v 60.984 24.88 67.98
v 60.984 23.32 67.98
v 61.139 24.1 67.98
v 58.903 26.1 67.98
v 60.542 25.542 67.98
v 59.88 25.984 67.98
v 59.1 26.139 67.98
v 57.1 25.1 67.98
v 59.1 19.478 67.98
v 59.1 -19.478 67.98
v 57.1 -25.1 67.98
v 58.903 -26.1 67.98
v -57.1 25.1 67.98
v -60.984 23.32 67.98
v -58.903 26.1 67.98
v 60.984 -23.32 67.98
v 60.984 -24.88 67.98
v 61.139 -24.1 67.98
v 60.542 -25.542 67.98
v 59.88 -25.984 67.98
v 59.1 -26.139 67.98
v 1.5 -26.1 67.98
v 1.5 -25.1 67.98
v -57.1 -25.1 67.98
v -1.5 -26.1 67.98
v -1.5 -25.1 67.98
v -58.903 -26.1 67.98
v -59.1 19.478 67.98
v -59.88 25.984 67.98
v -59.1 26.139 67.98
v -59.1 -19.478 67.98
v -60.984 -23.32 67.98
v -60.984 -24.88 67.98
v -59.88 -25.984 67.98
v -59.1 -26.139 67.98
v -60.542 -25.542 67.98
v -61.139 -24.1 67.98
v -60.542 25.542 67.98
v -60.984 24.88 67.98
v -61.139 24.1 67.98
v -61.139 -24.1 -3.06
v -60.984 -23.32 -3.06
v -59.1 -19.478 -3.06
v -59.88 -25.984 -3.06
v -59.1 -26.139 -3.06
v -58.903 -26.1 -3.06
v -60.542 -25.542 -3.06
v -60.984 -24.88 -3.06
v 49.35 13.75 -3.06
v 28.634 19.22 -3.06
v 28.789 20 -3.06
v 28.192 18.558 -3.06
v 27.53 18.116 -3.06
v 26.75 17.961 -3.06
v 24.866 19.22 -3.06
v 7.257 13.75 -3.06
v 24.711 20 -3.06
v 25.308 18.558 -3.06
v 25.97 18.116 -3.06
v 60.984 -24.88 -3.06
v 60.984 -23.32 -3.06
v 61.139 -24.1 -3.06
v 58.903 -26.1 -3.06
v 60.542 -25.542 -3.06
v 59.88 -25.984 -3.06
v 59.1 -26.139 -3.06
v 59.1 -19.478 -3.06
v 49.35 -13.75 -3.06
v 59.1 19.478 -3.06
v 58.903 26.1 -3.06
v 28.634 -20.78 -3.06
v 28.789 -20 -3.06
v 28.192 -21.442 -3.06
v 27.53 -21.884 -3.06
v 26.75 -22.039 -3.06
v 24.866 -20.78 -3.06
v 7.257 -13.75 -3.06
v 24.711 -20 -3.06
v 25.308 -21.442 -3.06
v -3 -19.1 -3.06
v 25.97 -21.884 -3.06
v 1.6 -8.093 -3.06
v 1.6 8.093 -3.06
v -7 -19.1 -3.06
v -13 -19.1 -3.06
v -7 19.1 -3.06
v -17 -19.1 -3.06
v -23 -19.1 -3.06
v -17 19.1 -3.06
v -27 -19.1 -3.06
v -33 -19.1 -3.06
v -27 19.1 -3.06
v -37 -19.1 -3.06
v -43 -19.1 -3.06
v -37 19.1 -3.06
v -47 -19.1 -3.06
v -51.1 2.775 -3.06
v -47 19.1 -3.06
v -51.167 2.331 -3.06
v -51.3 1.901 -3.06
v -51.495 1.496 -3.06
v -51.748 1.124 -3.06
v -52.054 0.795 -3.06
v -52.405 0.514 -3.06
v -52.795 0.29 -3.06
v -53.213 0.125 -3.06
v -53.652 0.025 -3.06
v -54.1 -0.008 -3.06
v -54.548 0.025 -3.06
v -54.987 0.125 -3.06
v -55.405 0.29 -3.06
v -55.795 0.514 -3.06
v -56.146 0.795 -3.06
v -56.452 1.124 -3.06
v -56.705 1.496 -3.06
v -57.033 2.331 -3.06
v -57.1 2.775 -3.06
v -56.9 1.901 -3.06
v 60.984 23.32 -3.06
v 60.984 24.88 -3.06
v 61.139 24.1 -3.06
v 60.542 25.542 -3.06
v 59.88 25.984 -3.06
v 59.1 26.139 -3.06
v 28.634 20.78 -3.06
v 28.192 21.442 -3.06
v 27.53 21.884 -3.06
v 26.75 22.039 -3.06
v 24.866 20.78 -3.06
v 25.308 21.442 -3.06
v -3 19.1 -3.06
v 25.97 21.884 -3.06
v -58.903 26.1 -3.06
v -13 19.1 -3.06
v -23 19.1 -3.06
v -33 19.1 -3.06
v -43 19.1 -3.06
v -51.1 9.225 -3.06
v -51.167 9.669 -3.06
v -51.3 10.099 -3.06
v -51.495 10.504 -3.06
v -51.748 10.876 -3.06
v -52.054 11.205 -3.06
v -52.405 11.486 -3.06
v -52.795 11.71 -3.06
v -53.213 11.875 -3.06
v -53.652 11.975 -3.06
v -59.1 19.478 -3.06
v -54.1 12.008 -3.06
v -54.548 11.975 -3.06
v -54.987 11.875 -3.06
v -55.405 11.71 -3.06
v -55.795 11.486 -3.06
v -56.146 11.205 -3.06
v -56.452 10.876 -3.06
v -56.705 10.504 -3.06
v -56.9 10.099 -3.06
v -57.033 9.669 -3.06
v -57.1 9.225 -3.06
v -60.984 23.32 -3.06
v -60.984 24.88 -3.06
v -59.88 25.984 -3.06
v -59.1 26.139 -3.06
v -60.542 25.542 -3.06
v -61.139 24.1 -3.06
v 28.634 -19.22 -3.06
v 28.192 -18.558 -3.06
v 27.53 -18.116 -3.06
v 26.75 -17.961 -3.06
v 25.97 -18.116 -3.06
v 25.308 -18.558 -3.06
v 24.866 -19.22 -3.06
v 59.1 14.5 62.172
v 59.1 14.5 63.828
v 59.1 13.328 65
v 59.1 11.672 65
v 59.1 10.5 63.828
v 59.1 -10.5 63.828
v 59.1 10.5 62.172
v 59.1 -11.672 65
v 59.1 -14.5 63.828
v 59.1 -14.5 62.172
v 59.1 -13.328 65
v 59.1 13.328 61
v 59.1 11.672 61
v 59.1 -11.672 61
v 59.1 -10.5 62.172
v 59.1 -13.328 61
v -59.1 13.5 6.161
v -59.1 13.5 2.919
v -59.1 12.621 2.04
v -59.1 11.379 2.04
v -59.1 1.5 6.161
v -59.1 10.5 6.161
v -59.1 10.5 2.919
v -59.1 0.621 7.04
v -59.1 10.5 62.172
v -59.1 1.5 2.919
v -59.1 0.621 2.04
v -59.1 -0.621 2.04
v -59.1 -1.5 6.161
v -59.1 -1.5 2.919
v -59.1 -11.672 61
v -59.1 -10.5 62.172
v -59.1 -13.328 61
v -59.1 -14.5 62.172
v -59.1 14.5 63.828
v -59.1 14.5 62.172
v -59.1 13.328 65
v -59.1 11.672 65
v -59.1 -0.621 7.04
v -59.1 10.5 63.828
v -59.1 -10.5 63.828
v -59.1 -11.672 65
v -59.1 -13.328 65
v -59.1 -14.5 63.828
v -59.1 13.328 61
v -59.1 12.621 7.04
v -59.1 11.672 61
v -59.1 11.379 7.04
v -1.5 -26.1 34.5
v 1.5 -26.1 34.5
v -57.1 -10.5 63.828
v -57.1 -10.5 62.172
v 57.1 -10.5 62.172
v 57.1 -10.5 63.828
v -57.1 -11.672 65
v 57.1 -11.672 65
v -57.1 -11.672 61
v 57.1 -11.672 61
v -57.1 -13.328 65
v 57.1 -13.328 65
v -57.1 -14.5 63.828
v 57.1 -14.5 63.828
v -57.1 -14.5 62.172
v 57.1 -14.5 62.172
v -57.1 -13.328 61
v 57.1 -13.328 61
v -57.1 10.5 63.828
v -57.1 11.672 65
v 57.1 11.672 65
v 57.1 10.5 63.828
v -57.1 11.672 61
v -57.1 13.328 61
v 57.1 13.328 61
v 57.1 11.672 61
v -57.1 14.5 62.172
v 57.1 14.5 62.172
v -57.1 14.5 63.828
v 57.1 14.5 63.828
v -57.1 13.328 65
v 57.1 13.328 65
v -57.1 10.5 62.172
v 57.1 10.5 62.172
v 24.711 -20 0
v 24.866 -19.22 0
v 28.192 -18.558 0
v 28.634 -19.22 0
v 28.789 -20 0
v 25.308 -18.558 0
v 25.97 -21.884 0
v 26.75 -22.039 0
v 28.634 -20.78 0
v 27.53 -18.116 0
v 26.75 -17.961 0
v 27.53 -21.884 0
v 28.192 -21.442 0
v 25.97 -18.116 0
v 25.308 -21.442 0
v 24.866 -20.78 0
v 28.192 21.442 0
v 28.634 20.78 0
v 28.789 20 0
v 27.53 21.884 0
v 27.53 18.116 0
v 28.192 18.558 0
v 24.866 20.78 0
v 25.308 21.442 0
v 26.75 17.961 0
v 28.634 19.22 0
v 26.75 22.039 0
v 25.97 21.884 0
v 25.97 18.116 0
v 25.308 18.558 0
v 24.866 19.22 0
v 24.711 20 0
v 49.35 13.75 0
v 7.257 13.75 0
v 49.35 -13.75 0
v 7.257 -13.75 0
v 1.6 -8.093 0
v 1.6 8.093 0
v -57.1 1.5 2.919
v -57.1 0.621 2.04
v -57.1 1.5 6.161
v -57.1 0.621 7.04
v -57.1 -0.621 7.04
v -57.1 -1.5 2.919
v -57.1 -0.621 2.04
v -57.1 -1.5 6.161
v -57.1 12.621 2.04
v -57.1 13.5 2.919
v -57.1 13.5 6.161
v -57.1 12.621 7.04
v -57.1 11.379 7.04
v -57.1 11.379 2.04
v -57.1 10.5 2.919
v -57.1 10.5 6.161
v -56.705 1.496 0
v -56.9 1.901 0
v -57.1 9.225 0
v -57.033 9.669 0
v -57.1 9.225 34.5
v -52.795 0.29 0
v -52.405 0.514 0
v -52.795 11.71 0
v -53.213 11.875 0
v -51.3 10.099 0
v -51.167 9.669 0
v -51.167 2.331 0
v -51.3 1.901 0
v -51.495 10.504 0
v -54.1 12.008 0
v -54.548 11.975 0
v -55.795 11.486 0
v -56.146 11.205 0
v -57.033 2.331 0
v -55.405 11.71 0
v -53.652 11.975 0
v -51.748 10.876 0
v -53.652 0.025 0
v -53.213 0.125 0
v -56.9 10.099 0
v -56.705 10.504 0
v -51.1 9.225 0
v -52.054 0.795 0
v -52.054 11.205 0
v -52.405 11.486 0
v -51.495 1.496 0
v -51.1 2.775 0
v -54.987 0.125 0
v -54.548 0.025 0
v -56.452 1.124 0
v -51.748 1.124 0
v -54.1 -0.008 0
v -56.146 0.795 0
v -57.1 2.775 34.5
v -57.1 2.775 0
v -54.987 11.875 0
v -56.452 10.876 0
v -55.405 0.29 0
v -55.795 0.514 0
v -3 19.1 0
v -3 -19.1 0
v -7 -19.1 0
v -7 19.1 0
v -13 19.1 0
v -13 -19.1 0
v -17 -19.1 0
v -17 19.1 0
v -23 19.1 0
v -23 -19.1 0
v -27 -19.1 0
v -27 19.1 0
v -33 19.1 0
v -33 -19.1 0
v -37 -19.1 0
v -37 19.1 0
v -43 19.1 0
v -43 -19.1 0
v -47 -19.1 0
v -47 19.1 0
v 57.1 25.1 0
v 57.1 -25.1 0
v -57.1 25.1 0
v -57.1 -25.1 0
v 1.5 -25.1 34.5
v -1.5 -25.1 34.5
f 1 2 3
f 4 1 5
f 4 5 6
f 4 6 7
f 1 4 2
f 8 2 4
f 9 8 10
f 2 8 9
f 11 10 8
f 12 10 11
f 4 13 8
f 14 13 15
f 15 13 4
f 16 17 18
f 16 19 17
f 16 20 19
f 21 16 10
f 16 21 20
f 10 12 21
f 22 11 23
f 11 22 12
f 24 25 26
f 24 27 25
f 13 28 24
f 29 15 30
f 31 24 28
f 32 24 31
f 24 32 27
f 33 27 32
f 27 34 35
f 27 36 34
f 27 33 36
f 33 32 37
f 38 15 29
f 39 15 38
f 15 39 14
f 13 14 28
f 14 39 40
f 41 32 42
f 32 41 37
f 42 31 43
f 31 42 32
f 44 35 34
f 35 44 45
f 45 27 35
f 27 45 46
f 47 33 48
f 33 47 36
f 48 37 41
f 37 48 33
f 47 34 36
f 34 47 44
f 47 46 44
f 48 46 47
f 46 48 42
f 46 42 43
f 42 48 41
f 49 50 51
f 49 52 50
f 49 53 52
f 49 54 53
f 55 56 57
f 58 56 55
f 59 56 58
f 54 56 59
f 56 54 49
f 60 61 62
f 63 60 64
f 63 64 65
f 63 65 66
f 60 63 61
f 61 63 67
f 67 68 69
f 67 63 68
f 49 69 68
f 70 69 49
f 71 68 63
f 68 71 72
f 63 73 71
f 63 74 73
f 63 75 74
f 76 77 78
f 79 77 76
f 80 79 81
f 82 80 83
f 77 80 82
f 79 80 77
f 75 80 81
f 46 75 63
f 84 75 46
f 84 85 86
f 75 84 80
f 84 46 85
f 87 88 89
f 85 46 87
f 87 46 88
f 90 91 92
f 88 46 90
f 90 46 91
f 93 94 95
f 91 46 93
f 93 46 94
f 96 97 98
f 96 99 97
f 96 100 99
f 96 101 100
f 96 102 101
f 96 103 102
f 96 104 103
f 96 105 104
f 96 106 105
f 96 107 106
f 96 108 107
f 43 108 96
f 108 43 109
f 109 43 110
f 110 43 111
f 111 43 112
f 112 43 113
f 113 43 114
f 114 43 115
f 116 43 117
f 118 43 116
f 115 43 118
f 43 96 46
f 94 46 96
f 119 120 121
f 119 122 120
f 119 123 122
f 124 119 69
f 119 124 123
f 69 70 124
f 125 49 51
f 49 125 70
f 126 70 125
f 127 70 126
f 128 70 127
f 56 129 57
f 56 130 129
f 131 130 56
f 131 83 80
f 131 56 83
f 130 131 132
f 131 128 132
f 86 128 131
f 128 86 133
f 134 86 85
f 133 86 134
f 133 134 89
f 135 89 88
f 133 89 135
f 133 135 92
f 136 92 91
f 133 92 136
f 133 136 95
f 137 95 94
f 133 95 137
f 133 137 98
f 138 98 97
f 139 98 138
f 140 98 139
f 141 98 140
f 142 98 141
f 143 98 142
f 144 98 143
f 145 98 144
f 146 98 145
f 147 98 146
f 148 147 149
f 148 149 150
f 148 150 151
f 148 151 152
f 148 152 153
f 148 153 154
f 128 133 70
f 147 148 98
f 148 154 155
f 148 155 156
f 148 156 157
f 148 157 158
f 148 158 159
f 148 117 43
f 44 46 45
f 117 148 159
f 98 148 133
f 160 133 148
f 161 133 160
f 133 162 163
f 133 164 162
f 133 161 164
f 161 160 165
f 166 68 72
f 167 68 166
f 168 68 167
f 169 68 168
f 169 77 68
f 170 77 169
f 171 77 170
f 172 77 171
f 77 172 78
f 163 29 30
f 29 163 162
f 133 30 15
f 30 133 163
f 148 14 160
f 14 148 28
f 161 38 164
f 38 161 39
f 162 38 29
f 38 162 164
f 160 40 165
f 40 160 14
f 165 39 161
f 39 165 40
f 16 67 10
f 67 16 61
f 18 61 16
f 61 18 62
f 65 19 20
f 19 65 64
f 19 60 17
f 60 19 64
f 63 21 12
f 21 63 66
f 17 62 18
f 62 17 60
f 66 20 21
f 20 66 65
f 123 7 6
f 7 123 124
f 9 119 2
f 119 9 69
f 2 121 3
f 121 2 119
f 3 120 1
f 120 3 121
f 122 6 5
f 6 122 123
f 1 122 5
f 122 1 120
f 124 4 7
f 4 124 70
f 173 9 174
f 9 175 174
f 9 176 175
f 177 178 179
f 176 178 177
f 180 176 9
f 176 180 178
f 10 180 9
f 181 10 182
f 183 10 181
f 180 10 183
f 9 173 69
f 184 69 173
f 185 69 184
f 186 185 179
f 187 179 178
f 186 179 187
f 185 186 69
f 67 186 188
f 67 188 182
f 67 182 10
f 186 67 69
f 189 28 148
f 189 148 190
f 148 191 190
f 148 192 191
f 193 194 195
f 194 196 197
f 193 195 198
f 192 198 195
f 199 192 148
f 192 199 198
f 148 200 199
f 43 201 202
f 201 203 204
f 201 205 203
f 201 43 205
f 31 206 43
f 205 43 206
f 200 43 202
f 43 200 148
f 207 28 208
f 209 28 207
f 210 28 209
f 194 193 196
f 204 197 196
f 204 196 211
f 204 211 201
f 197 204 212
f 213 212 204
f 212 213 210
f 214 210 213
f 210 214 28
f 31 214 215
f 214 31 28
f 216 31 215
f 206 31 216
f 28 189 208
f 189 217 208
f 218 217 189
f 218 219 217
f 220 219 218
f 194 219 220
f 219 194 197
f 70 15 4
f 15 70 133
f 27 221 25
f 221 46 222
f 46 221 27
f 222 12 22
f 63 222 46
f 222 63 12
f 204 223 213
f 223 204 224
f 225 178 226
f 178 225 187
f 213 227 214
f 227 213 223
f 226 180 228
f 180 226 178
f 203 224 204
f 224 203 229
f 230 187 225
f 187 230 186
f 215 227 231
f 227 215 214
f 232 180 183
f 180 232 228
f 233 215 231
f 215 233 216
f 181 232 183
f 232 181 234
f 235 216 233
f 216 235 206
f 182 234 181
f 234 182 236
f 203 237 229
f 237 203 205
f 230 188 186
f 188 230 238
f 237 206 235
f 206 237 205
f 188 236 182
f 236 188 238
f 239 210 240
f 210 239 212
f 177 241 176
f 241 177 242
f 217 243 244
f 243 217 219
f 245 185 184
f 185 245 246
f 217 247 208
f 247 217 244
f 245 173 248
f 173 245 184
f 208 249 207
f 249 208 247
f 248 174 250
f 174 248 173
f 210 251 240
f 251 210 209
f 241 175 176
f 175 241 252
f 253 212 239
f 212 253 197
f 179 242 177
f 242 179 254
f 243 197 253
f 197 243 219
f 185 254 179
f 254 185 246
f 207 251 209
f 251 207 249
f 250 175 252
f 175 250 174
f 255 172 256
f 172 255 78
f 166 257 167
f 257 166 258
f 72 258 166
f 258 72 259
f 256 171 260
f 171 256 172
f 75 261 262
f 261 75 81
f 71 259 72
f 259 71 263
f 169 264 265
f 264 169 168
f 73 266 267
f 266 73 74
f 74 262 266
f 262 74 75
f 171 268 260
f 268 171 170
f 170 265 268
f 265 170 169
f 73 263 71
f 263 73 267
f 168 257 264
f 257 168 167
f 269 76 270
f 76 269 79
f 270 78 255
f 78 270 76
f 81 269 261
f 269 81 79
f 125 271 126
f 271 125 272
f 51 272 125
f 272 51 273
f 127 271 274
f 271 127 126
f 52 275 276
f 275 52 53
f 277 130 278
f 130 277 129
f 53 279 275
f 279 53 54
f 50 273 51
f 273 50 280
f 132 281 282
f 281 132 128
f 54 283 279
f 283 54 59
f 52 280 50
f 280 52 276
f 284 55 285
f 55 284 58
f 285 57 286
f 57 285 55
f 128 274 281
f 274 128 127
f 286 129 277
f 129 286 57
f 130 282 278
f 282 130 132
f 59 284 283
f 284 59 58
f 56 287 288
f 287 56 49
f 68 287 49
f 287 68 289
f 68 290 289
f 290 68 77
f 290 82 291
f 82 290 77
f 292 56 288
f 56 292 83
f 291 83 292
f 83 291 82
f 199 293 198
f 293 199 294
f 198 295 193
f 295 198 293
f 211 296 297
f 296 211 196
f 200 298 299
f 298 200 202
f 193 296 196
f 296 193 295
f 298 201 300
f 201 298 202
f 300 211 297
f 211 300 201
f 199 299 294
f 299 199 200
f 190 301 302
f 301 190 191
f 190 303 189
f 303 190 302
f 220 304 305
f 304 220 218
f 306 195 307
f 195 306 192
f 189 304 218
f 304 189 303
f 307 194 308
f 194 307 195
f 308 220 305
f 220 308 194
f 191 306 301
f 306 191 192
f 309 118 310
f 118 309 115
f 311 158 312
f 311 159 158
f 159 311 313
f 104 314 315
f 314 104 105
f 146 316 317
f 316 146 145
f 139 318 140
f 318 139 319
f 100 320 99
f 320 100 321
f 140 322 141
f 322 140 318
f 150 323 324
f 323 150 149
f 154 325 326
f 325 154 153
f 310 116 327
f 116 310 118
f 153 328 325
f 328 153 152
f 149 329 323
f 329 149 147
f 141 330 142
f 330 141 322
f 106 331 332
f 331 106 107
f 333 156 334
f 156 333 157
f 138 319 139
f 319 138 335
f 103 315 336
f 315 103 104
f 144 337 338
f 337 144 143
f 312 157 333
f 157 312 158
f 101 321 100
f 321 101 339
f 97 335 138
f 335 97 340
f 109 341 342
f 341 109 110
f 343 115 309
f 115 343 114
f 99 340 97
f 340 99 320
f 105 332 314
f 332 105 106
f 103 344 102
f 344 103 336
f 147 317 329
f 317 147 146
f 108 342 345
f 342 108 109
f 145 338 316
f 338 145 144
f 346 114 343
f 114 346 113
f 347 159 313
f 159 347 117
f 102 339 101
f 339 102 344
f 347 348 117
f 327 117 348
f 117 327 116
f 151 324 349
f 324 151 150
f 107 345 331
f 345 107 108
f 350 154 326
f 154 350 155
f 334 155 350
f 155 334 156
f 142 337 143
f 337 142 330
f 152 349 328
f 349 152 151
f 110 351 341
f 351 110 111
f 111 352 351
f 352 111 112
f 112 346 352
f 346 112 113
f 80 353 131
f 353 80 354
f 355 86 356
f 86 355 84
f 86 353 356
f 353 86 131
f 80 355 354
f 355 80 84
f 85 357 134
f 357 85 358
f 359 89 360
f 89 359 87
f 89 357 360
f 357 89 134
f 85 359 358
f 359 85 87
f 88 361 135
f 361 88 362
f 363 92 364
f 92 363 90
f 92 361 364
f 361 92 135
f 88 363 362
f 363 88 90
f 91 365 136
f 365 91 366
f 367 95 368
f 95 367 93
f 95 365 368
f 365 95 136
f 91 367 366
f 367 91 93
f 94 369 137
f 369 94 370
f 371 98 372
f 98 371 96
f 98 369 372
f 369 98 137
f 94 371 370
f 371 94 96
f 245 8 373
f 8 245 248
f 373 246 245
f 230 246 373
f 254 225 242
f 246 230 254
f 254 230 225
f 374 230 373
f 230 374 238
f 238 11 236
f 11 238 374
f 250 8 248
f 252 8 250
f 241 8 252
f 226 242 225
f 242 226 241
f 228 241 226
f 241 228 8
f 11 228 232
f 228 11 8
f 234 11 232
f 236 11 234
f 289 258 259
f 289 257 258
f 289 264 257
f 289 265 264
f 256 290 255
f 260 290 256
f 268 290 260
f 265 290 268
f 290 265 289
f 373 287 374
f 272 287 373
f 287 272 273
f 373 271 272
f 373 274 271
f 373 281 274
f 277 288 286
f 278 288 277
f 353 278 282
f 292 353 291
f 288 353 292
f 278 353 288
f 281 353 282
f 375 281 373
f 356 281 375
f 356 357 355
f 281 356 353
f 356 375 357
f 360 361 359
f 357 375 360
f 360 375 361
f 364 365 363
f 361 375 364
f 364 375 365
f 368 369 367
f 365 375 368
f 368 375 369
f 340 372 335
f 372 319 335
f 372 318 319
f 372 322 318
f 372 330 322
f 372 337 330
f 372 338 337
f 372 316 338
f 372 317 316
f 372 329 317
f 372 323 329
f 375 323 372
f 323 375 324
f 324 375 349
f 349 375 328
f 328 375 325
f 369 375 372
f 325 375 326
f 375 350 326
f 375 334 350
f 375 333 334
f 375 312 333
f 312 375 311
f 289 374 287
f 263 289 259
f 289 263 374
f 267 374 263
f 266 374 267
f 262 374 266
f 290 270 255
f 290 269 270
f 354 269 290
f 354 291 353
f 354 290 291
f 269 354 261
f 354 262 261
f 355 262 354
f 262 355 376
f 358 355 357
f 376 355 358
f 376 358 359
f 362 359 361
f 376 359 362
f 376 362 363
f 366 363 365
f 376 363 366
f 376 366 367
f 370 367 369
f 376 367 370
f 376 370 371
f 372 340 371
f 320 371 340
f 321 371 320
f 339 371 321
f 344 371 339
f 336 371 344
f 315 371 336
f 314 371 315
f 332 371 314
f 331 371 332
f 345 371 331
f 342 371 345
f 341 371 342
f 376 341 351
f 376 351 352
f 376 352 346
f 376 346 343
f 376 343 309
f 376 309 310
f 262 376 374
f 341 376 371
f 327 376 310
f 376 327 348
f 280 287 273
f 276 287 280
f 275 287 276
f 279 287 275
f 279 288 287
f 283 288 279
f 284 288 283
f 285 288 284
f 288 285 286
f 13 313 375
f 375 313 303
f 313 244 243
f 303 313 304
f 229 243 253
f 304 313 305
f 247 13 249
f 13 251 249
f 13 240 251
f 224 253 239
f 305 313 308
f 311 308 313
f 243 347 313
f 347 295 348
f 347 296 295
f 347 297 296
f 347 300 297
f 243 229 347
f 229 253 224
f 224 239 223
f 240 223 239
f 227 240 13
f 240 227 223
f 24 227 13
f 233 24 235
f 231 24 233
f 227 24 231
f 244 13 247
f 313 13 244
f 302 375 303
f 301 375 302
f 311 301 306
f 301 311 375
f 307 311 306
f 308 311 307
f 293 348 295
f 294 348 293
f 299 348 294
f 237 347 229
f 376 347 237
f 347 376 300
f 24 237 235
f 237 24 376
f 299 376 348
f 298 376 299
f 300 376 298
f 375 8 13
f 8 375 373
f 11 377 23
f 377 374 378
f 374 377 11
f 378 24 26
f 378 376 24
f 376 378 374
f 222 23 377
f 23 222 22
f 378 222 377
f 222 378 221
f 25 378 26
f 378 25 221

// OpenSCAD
// file: common.scad
left = -1;
right = 1;
front = -1;
rear = 1;

// adjust these numbers as necessary
psu_length = 215;
psu_width = 114;
psu_height = 50;

// screw terminals
screw_terminal_inset = 17;
screw_terminal_width = 110;
screw_terminal_height = 25;

// large mount holes on the bottom of the PSU
bottom_mount_hole_spacing_width = 50;
bottom_mount_hole_spacing_length = 150;
bottom_mount_hole_spacing_from_end = 32.5;
bottom_mount_hole_spacing_from_side = 32;

side_mount_hole_from_end = 33;
side_mount_hole_spacing = 25;
side_mount_hole_from_top = 13;

mount_hole_diam = 4;
cover_mount_hole_diam = 4.1;

// Don't make this too thin; plug insertion/removal puts a fair amount of strain on the part
wall_thickness = 2;
end_thickness = wall_thickness*2;

total_width = psu_width + wall_thickness * 2;
total_height = psu_height + wall_thickness * 2;

// How far the end of the cover should be from the end of the PSU.
// This is to leave room for the plug and cables (if necessary)
cavity_depth = 0;

function get_total_depth(cavity) = cavity + end_thickness + side_mount_hole_from_end + mount_hole_diam/2 + wall_thickness * 2;

// Hole to feed wires from the PSU to your electronics
wire_hole_width  = 12;
wire_hole_height = 6;

da6 = 1 / cos(180 / 6) / 2;

module mount_hole() {
  rotate([0,90,0]) rotate([0,0,90])
    cylinder(r=cover_mount_hole_diam*da6,h=total_width+1,center=true,$fn=6);
}

module mount_holes() {
  from_center = psu_height/2-side_mount_hole_spacing/2-side_mount_hole_from_top;

  translate([0,-from_center,end_thickness+side_mount_hole_from_end+cavity_depth])
    for(side=[front,rear]) {
      translate([0,-side_mount_hole_spacing/2*side,0]) mount_hole();
    }
}

module vent_holes() {
  // ventilation/material saving holes on the side
  for(from_end=[0:6]) {
    for(from_top=[.8,.45,.1]) {
      translate([-1,psu_height*from_top-wall_thickness,wall_thickness*3.25+8*from_end]) {
        cube([psu_width*2,13,4]);
      }
    }
  }

  // top/bottom holes
  for(from_end=[0:5]) {
    for(from_side=[0:5]) {
      translate([wall_thickness*4+from_side*17.7,-1,wall_thickness*2.5+8*from_end]) {
        cube([13.5,psu_height*2,4]);
      }
    }
  }

  // smaller holes on the end
  for(h=[0]) {
    for(n=[0:5]) {
      translate([wall_thickness*6+8.5*n,wall_thickness*3+h*(total_height/2-wall_thickness),-1])
        cube([4,total_height-wall_thickness*6,psu_length]);
    }
  }
}

module psu() {
  translate([-psu_width/2,-psu_height/2,0])
  difference() {
    cube([psu_width,psu_height,psu_length]);
    translate([(psu_width - screw_terminal_width) / 2, -1, -1]) cube([screw_terminal_width,screw_terminal_height + 1,screw_terminal_inset + 1]);

    // cover mounting holes
    translate([0,side_mount_hole_from_top,side_mount_hole_from_end]) rotate([0,90,0])
      cylinder(h=psu_width * 4,r=mount_hole_diam/2, center=true);
    translate([0,side_mount_hole_from_top + side_mount_hole_spacing,side_mount_hole_from_end]) rotate([0,90,0])
      cylinder(h=psu_width * 4,r=mount_hole_diam/2, center=true);

    // psu mounting holes (terminal side)
    translate([bottom_mount_hole_spacing_from_side,0,bottom_mount_hole_spacing_from_end]) rotate([90,0,0])
      cylinder(h=psu_width * 4,r=mount_hole_diam/2, center=true);
    translate([bottom_mount_hole_spacing_from_side + bottom_mount_hole_spacing_width,0,bottom_mount_hole_spacing_from_end]) rotate([90,0,0])
      cylinder(h=psu_width * 4,r=mount_hole_diam/2, center=true);

    // psu mounting holes (blank side)
    translate([bottom_mount_hole_spacing_from_side,0,bottom_mount_hole_spacing_from_end + bottom_mount_hole_spacing_length]) rotate([90,0,0]) cylinder(h=psu_width * 2,r=mount_hole_diam/2, center=true);
    translate([bottom_mount_hole_spacing_from_side + bottom_mount_hole_spacing_width,0,bottom_mount_hole_spacing_from_end + bottom_mount_hole_spacing_length]) rotate([90,0,0]) cylinder(h=psu_width * 2,r=mount_hole_diam/2, center=true);
  }
}

function accurate_diam(diam,sides=16) = 1 / cos(180 / sides) * diam;

module hole(diam,height,sides=16) {
  diam = accurate_diam(diam,sides);

  cylinder(r=diam/2,h=height,center=true,$fn=sides);
}
// main file
include <common.scad>;

cavity_depth = 30;
total_depth = get_total_depth(cavity_depth);

plug_width = 27.5;
plug_height = 47.5;
plug_hole_from_switch_end = 22.5;
plug_hole_width = 40;

side_brace_width = 6;
top_shortness = screw_terminal_inset;
bottom_shortness = cavity_depth-wall_thickness;

module vent_holes() {
  hole_from_top_bottom = 5;
  hole_length = total_height-wall_thickness*2-hole_from_top_bottom*2;
  hole_width  = 4;
  hole_space_between = 6;
  hole_spacing = hole_width + hole_space_between;

  for(i=[0:4]) {
    translate([i*-hole_spacing-hole_width,0,end_thickness/2]) {
      cube([hole_width,hole_length,end_thickness+1],center=true);
    }
  }
}

module mount_holes() {
  from_center = psu_height/2-side_mount_hole_spacing/2-side_mount_hole_from_top;

  translate([0,-from_center,end_thickness+side_mount_hole_from_end+cavity_depth])
    for(side=[front,rear]) {
      translate([0,-side_mount_hole_spacing/2*side,0]) {
        mount_hole();
      }
    }
}

module old_cover() {
  plug_dist_from_wall = 5;

  difference() {
    translate([0,0,total_depth/2])
      cube([total_width,total_height,total_depth],center=true);

    // main cavity
    translate([0,0,end_thickness+total_depth/2])
      cube([psu_width,psu_height,total_depth],center=true);

    mount_holes();

    translate([0,0,total_depth]) {
      // material saving top
      translate([0,-psu_height/2,0])
        cube([psu_width - side_brace_width*2,wall_thickness*3,top_shortness*2],center=true);

      // material saving bottom
      translate([0,psu_height/2,0])
        cube([psu_width - side_brace_width*2,wall_thickness*3,bottom_shortness*2],center=true);
    }

    vent_holes();

    // plug
    translate([total_width/2-wall_thickness-plug_height/2-plug_dist_from_wall,0,0])
      scale([1,1,10]) rotate([0,0,180]) plug_hole();

    // wire hole
    translate([-total_width/2+wall_thickness+wire_hole_height/2,total_height/4-wire_hole_width/2,end_thickness/2])
      cube([wire_hole_height,wire_hole_width,end_thickness+1],center=true);
  }
}

module old_plug_hole() {
  spacer            = 0.5;
  plug_width        = 27   + spacer;
  plug_length       = 47.5 + spacer;
  plug_angle_length = 8;

  // mounting holes
  for (side=[1,-1]) {
    translate([-1*(plug_height/2-plug_hole_from_switch_end),plug_hole_width/2*side,0])
      hole(3.7,wall_thickness*2,16);
  }

  difference() {
    cube([plug_height,plug_width,wall_thickness],center=true);

    // angled corners on plug side
    for (side=[1,-1]) {
      translate([plug_height/2,plug_width/2*side,0]) {
        rotate([0,0,45]) {
          cube([8.5,8.5,wall_thickness*2],center=true);
        }
      }
    }
  }
}

module plug_hole() {
  spacer            = 0.5;
  plug_width        = 27   + spacer;
  plug_length       = 47.5 + spacer;
  plug_angle_length = 8;
  plug_angle_offset = sqrt(pow(plug_angle_length,2)/2);
  plug_hole_spacing = 40;
  plug_hole_offset  = 1.4;
  hole_height       = 20;

  // mounting holes
  for (side=[front,rear]) {
    translate([plug_hole_offset,plug_hole_spacing/2*side,0]) {
      hole(4,hole_height,16);
    }
  }

  hull() {
    translate([plug_length/4,0,0]) {
      cube([plug_length/2,plug_width,hole_height],center=true);
    }

    // angled corners on plug side
    for (side=[1,-1]) {
      translate([-plug_height/2+plug_angle_offset,(plug_width/2-plug_angle_offset)*side,0]) {
        //cylinder(r=plug_angle_length/2,h=100,center=true,$fn=4);
        hole(plug_angle_length,hole_height,4);
      }
    }
  }
}

module cover() {
  spacer               = 0.2;
  dist_from_psu_to_end = 30;
  plug_dist_from_side  = 8;

  cavity_width  = psu_width  + spacer;
  cavity_height = psu_height + spacer;
  cavity_length = dist_from_psu_to_end + side_mount_hole_from_end + mount_hole_diam/2 + end_thickness;

  side_mount_hole_from_end = 33;
  side_mount_hole_spacing  = 25;
  side_mount_hole_from_top = 13;

  extrusion_width      = 0.5;
  extrusion_height     = 0.34;
  thick_wall_thickness = extrusion_width  * 4;
  thin_wall_thickness  = extrusion_width  * 2;
  end_thickness        = extrusion_height * 6;

  total_width  = cavity_width  + wall_thickness * 2;
  total_height = cavity_height + thin_wall_thickness * 2;

  wire_hole_width  = 6;
  wire_hole_height = 12;

  module body() {
    width  = cavity_width  + thick_wall_thickness * 2;
    height = cavity_height + thin_wall_thickness * 2;

    translate([0,0,cavity_length/2-end_thickness]) {
      cube([width,height,cavity_length+end_thickness],center=true);

      for(side=[left,right]) {
        for(end=[front,rear]) {
          hull() {
            translate([width/2*side,(height/2-thick_wall_thickness)*end,0]) {
              hole(thick_wall_thickness*2,cavity_length+end_thickness,16);
            }
            translate([width*.4*side,0,0]) {
              hole(thick_wall_thickness*2,cavity_length+end_thickness,16);
            }
          }
        }
      }
    }
  }

  module holes() {
    // main cavity
    translate([0,0,cavity_length]) {
      cube([cavity_width,cavity_height,cavity_length*2],center=true);
    }

    // mount holes
    for(side=[front,rear]) {
      translate([0,side_mount_hole_spacing/2*side,dist_from_psu_to_end+side_mount_hole_from_end]) {
        rotate([0,90,0]) {
          rotate([0,0,22.5]) {
            hole(mount_hole_diam,cavity_width*2,8);
          }
        }
      }
    }

    // plug
    translate([cavity_width/2-plug_height/2-plug_dist_from_side,0,0]) {
      scale([1,1,10]) {
        plug_hole();
      }
    }

    // wire retainer/hole
    zip_tie_hole_width  = 3;
    zip_tie_hole_height = 5;
    translate([left*(cavity_width/2-wire_hole_width/2),wire_hole_height/2,0]) {
      hull() {
        for(side=[front,rear]) {
          translate([0,side*(wire_hole_height/2-wire_hole_width/2),0]) {
            rotate([0,0,90]) {
              hole(wire_hole_width,cavity_length,42);
            }
          }
        }
      }

      for(side=[front,rear]) {
        translate([0,(wire_hole_height/2)*side,end_thickness+1.5]) {
          hull() {
            rotate([0,90,0]) {
              rotate([0,0,22.5]) {
                hole(zip_tie_hole_width,cavity_height,8);
              }
            }
            translate([0,0,zip_tie_hole_height-zip_tie_hole_width]) {
              rotate([0,90,0]) {
                rotate([0,0,22.5]) {
                  hole(zip_tie_hole_width,cavity_height,8);
                }
              }
            }
          }
        }
      }
    }

    // vent holes
    hole_from_top_bottom = 5;
    hole_length = total_height-wall_thickness*2-hole_from_top_bottom*2;
    hole_width  = 4;
    hole_space_between = 6;
    hole_spacing = hole_width + hole_space_between;

    for(i=[0:4]) {
      translate([i*-hole_spacing-hole_width-1,0,end_thickness/2]) {
        cube([hole_width,hole_length,cavity_length/2],center=true);
      }
    }

    // not sure why I'm doing this, but it *seems* like a good idea
    translate([0,-cavity_height/2,cavity_length]) {
      cube([3,thick_wall_thickness*2,cavity_length],center=true);
    }
  }

  difference() {
    body();
    holes();
  }
}

cover();
